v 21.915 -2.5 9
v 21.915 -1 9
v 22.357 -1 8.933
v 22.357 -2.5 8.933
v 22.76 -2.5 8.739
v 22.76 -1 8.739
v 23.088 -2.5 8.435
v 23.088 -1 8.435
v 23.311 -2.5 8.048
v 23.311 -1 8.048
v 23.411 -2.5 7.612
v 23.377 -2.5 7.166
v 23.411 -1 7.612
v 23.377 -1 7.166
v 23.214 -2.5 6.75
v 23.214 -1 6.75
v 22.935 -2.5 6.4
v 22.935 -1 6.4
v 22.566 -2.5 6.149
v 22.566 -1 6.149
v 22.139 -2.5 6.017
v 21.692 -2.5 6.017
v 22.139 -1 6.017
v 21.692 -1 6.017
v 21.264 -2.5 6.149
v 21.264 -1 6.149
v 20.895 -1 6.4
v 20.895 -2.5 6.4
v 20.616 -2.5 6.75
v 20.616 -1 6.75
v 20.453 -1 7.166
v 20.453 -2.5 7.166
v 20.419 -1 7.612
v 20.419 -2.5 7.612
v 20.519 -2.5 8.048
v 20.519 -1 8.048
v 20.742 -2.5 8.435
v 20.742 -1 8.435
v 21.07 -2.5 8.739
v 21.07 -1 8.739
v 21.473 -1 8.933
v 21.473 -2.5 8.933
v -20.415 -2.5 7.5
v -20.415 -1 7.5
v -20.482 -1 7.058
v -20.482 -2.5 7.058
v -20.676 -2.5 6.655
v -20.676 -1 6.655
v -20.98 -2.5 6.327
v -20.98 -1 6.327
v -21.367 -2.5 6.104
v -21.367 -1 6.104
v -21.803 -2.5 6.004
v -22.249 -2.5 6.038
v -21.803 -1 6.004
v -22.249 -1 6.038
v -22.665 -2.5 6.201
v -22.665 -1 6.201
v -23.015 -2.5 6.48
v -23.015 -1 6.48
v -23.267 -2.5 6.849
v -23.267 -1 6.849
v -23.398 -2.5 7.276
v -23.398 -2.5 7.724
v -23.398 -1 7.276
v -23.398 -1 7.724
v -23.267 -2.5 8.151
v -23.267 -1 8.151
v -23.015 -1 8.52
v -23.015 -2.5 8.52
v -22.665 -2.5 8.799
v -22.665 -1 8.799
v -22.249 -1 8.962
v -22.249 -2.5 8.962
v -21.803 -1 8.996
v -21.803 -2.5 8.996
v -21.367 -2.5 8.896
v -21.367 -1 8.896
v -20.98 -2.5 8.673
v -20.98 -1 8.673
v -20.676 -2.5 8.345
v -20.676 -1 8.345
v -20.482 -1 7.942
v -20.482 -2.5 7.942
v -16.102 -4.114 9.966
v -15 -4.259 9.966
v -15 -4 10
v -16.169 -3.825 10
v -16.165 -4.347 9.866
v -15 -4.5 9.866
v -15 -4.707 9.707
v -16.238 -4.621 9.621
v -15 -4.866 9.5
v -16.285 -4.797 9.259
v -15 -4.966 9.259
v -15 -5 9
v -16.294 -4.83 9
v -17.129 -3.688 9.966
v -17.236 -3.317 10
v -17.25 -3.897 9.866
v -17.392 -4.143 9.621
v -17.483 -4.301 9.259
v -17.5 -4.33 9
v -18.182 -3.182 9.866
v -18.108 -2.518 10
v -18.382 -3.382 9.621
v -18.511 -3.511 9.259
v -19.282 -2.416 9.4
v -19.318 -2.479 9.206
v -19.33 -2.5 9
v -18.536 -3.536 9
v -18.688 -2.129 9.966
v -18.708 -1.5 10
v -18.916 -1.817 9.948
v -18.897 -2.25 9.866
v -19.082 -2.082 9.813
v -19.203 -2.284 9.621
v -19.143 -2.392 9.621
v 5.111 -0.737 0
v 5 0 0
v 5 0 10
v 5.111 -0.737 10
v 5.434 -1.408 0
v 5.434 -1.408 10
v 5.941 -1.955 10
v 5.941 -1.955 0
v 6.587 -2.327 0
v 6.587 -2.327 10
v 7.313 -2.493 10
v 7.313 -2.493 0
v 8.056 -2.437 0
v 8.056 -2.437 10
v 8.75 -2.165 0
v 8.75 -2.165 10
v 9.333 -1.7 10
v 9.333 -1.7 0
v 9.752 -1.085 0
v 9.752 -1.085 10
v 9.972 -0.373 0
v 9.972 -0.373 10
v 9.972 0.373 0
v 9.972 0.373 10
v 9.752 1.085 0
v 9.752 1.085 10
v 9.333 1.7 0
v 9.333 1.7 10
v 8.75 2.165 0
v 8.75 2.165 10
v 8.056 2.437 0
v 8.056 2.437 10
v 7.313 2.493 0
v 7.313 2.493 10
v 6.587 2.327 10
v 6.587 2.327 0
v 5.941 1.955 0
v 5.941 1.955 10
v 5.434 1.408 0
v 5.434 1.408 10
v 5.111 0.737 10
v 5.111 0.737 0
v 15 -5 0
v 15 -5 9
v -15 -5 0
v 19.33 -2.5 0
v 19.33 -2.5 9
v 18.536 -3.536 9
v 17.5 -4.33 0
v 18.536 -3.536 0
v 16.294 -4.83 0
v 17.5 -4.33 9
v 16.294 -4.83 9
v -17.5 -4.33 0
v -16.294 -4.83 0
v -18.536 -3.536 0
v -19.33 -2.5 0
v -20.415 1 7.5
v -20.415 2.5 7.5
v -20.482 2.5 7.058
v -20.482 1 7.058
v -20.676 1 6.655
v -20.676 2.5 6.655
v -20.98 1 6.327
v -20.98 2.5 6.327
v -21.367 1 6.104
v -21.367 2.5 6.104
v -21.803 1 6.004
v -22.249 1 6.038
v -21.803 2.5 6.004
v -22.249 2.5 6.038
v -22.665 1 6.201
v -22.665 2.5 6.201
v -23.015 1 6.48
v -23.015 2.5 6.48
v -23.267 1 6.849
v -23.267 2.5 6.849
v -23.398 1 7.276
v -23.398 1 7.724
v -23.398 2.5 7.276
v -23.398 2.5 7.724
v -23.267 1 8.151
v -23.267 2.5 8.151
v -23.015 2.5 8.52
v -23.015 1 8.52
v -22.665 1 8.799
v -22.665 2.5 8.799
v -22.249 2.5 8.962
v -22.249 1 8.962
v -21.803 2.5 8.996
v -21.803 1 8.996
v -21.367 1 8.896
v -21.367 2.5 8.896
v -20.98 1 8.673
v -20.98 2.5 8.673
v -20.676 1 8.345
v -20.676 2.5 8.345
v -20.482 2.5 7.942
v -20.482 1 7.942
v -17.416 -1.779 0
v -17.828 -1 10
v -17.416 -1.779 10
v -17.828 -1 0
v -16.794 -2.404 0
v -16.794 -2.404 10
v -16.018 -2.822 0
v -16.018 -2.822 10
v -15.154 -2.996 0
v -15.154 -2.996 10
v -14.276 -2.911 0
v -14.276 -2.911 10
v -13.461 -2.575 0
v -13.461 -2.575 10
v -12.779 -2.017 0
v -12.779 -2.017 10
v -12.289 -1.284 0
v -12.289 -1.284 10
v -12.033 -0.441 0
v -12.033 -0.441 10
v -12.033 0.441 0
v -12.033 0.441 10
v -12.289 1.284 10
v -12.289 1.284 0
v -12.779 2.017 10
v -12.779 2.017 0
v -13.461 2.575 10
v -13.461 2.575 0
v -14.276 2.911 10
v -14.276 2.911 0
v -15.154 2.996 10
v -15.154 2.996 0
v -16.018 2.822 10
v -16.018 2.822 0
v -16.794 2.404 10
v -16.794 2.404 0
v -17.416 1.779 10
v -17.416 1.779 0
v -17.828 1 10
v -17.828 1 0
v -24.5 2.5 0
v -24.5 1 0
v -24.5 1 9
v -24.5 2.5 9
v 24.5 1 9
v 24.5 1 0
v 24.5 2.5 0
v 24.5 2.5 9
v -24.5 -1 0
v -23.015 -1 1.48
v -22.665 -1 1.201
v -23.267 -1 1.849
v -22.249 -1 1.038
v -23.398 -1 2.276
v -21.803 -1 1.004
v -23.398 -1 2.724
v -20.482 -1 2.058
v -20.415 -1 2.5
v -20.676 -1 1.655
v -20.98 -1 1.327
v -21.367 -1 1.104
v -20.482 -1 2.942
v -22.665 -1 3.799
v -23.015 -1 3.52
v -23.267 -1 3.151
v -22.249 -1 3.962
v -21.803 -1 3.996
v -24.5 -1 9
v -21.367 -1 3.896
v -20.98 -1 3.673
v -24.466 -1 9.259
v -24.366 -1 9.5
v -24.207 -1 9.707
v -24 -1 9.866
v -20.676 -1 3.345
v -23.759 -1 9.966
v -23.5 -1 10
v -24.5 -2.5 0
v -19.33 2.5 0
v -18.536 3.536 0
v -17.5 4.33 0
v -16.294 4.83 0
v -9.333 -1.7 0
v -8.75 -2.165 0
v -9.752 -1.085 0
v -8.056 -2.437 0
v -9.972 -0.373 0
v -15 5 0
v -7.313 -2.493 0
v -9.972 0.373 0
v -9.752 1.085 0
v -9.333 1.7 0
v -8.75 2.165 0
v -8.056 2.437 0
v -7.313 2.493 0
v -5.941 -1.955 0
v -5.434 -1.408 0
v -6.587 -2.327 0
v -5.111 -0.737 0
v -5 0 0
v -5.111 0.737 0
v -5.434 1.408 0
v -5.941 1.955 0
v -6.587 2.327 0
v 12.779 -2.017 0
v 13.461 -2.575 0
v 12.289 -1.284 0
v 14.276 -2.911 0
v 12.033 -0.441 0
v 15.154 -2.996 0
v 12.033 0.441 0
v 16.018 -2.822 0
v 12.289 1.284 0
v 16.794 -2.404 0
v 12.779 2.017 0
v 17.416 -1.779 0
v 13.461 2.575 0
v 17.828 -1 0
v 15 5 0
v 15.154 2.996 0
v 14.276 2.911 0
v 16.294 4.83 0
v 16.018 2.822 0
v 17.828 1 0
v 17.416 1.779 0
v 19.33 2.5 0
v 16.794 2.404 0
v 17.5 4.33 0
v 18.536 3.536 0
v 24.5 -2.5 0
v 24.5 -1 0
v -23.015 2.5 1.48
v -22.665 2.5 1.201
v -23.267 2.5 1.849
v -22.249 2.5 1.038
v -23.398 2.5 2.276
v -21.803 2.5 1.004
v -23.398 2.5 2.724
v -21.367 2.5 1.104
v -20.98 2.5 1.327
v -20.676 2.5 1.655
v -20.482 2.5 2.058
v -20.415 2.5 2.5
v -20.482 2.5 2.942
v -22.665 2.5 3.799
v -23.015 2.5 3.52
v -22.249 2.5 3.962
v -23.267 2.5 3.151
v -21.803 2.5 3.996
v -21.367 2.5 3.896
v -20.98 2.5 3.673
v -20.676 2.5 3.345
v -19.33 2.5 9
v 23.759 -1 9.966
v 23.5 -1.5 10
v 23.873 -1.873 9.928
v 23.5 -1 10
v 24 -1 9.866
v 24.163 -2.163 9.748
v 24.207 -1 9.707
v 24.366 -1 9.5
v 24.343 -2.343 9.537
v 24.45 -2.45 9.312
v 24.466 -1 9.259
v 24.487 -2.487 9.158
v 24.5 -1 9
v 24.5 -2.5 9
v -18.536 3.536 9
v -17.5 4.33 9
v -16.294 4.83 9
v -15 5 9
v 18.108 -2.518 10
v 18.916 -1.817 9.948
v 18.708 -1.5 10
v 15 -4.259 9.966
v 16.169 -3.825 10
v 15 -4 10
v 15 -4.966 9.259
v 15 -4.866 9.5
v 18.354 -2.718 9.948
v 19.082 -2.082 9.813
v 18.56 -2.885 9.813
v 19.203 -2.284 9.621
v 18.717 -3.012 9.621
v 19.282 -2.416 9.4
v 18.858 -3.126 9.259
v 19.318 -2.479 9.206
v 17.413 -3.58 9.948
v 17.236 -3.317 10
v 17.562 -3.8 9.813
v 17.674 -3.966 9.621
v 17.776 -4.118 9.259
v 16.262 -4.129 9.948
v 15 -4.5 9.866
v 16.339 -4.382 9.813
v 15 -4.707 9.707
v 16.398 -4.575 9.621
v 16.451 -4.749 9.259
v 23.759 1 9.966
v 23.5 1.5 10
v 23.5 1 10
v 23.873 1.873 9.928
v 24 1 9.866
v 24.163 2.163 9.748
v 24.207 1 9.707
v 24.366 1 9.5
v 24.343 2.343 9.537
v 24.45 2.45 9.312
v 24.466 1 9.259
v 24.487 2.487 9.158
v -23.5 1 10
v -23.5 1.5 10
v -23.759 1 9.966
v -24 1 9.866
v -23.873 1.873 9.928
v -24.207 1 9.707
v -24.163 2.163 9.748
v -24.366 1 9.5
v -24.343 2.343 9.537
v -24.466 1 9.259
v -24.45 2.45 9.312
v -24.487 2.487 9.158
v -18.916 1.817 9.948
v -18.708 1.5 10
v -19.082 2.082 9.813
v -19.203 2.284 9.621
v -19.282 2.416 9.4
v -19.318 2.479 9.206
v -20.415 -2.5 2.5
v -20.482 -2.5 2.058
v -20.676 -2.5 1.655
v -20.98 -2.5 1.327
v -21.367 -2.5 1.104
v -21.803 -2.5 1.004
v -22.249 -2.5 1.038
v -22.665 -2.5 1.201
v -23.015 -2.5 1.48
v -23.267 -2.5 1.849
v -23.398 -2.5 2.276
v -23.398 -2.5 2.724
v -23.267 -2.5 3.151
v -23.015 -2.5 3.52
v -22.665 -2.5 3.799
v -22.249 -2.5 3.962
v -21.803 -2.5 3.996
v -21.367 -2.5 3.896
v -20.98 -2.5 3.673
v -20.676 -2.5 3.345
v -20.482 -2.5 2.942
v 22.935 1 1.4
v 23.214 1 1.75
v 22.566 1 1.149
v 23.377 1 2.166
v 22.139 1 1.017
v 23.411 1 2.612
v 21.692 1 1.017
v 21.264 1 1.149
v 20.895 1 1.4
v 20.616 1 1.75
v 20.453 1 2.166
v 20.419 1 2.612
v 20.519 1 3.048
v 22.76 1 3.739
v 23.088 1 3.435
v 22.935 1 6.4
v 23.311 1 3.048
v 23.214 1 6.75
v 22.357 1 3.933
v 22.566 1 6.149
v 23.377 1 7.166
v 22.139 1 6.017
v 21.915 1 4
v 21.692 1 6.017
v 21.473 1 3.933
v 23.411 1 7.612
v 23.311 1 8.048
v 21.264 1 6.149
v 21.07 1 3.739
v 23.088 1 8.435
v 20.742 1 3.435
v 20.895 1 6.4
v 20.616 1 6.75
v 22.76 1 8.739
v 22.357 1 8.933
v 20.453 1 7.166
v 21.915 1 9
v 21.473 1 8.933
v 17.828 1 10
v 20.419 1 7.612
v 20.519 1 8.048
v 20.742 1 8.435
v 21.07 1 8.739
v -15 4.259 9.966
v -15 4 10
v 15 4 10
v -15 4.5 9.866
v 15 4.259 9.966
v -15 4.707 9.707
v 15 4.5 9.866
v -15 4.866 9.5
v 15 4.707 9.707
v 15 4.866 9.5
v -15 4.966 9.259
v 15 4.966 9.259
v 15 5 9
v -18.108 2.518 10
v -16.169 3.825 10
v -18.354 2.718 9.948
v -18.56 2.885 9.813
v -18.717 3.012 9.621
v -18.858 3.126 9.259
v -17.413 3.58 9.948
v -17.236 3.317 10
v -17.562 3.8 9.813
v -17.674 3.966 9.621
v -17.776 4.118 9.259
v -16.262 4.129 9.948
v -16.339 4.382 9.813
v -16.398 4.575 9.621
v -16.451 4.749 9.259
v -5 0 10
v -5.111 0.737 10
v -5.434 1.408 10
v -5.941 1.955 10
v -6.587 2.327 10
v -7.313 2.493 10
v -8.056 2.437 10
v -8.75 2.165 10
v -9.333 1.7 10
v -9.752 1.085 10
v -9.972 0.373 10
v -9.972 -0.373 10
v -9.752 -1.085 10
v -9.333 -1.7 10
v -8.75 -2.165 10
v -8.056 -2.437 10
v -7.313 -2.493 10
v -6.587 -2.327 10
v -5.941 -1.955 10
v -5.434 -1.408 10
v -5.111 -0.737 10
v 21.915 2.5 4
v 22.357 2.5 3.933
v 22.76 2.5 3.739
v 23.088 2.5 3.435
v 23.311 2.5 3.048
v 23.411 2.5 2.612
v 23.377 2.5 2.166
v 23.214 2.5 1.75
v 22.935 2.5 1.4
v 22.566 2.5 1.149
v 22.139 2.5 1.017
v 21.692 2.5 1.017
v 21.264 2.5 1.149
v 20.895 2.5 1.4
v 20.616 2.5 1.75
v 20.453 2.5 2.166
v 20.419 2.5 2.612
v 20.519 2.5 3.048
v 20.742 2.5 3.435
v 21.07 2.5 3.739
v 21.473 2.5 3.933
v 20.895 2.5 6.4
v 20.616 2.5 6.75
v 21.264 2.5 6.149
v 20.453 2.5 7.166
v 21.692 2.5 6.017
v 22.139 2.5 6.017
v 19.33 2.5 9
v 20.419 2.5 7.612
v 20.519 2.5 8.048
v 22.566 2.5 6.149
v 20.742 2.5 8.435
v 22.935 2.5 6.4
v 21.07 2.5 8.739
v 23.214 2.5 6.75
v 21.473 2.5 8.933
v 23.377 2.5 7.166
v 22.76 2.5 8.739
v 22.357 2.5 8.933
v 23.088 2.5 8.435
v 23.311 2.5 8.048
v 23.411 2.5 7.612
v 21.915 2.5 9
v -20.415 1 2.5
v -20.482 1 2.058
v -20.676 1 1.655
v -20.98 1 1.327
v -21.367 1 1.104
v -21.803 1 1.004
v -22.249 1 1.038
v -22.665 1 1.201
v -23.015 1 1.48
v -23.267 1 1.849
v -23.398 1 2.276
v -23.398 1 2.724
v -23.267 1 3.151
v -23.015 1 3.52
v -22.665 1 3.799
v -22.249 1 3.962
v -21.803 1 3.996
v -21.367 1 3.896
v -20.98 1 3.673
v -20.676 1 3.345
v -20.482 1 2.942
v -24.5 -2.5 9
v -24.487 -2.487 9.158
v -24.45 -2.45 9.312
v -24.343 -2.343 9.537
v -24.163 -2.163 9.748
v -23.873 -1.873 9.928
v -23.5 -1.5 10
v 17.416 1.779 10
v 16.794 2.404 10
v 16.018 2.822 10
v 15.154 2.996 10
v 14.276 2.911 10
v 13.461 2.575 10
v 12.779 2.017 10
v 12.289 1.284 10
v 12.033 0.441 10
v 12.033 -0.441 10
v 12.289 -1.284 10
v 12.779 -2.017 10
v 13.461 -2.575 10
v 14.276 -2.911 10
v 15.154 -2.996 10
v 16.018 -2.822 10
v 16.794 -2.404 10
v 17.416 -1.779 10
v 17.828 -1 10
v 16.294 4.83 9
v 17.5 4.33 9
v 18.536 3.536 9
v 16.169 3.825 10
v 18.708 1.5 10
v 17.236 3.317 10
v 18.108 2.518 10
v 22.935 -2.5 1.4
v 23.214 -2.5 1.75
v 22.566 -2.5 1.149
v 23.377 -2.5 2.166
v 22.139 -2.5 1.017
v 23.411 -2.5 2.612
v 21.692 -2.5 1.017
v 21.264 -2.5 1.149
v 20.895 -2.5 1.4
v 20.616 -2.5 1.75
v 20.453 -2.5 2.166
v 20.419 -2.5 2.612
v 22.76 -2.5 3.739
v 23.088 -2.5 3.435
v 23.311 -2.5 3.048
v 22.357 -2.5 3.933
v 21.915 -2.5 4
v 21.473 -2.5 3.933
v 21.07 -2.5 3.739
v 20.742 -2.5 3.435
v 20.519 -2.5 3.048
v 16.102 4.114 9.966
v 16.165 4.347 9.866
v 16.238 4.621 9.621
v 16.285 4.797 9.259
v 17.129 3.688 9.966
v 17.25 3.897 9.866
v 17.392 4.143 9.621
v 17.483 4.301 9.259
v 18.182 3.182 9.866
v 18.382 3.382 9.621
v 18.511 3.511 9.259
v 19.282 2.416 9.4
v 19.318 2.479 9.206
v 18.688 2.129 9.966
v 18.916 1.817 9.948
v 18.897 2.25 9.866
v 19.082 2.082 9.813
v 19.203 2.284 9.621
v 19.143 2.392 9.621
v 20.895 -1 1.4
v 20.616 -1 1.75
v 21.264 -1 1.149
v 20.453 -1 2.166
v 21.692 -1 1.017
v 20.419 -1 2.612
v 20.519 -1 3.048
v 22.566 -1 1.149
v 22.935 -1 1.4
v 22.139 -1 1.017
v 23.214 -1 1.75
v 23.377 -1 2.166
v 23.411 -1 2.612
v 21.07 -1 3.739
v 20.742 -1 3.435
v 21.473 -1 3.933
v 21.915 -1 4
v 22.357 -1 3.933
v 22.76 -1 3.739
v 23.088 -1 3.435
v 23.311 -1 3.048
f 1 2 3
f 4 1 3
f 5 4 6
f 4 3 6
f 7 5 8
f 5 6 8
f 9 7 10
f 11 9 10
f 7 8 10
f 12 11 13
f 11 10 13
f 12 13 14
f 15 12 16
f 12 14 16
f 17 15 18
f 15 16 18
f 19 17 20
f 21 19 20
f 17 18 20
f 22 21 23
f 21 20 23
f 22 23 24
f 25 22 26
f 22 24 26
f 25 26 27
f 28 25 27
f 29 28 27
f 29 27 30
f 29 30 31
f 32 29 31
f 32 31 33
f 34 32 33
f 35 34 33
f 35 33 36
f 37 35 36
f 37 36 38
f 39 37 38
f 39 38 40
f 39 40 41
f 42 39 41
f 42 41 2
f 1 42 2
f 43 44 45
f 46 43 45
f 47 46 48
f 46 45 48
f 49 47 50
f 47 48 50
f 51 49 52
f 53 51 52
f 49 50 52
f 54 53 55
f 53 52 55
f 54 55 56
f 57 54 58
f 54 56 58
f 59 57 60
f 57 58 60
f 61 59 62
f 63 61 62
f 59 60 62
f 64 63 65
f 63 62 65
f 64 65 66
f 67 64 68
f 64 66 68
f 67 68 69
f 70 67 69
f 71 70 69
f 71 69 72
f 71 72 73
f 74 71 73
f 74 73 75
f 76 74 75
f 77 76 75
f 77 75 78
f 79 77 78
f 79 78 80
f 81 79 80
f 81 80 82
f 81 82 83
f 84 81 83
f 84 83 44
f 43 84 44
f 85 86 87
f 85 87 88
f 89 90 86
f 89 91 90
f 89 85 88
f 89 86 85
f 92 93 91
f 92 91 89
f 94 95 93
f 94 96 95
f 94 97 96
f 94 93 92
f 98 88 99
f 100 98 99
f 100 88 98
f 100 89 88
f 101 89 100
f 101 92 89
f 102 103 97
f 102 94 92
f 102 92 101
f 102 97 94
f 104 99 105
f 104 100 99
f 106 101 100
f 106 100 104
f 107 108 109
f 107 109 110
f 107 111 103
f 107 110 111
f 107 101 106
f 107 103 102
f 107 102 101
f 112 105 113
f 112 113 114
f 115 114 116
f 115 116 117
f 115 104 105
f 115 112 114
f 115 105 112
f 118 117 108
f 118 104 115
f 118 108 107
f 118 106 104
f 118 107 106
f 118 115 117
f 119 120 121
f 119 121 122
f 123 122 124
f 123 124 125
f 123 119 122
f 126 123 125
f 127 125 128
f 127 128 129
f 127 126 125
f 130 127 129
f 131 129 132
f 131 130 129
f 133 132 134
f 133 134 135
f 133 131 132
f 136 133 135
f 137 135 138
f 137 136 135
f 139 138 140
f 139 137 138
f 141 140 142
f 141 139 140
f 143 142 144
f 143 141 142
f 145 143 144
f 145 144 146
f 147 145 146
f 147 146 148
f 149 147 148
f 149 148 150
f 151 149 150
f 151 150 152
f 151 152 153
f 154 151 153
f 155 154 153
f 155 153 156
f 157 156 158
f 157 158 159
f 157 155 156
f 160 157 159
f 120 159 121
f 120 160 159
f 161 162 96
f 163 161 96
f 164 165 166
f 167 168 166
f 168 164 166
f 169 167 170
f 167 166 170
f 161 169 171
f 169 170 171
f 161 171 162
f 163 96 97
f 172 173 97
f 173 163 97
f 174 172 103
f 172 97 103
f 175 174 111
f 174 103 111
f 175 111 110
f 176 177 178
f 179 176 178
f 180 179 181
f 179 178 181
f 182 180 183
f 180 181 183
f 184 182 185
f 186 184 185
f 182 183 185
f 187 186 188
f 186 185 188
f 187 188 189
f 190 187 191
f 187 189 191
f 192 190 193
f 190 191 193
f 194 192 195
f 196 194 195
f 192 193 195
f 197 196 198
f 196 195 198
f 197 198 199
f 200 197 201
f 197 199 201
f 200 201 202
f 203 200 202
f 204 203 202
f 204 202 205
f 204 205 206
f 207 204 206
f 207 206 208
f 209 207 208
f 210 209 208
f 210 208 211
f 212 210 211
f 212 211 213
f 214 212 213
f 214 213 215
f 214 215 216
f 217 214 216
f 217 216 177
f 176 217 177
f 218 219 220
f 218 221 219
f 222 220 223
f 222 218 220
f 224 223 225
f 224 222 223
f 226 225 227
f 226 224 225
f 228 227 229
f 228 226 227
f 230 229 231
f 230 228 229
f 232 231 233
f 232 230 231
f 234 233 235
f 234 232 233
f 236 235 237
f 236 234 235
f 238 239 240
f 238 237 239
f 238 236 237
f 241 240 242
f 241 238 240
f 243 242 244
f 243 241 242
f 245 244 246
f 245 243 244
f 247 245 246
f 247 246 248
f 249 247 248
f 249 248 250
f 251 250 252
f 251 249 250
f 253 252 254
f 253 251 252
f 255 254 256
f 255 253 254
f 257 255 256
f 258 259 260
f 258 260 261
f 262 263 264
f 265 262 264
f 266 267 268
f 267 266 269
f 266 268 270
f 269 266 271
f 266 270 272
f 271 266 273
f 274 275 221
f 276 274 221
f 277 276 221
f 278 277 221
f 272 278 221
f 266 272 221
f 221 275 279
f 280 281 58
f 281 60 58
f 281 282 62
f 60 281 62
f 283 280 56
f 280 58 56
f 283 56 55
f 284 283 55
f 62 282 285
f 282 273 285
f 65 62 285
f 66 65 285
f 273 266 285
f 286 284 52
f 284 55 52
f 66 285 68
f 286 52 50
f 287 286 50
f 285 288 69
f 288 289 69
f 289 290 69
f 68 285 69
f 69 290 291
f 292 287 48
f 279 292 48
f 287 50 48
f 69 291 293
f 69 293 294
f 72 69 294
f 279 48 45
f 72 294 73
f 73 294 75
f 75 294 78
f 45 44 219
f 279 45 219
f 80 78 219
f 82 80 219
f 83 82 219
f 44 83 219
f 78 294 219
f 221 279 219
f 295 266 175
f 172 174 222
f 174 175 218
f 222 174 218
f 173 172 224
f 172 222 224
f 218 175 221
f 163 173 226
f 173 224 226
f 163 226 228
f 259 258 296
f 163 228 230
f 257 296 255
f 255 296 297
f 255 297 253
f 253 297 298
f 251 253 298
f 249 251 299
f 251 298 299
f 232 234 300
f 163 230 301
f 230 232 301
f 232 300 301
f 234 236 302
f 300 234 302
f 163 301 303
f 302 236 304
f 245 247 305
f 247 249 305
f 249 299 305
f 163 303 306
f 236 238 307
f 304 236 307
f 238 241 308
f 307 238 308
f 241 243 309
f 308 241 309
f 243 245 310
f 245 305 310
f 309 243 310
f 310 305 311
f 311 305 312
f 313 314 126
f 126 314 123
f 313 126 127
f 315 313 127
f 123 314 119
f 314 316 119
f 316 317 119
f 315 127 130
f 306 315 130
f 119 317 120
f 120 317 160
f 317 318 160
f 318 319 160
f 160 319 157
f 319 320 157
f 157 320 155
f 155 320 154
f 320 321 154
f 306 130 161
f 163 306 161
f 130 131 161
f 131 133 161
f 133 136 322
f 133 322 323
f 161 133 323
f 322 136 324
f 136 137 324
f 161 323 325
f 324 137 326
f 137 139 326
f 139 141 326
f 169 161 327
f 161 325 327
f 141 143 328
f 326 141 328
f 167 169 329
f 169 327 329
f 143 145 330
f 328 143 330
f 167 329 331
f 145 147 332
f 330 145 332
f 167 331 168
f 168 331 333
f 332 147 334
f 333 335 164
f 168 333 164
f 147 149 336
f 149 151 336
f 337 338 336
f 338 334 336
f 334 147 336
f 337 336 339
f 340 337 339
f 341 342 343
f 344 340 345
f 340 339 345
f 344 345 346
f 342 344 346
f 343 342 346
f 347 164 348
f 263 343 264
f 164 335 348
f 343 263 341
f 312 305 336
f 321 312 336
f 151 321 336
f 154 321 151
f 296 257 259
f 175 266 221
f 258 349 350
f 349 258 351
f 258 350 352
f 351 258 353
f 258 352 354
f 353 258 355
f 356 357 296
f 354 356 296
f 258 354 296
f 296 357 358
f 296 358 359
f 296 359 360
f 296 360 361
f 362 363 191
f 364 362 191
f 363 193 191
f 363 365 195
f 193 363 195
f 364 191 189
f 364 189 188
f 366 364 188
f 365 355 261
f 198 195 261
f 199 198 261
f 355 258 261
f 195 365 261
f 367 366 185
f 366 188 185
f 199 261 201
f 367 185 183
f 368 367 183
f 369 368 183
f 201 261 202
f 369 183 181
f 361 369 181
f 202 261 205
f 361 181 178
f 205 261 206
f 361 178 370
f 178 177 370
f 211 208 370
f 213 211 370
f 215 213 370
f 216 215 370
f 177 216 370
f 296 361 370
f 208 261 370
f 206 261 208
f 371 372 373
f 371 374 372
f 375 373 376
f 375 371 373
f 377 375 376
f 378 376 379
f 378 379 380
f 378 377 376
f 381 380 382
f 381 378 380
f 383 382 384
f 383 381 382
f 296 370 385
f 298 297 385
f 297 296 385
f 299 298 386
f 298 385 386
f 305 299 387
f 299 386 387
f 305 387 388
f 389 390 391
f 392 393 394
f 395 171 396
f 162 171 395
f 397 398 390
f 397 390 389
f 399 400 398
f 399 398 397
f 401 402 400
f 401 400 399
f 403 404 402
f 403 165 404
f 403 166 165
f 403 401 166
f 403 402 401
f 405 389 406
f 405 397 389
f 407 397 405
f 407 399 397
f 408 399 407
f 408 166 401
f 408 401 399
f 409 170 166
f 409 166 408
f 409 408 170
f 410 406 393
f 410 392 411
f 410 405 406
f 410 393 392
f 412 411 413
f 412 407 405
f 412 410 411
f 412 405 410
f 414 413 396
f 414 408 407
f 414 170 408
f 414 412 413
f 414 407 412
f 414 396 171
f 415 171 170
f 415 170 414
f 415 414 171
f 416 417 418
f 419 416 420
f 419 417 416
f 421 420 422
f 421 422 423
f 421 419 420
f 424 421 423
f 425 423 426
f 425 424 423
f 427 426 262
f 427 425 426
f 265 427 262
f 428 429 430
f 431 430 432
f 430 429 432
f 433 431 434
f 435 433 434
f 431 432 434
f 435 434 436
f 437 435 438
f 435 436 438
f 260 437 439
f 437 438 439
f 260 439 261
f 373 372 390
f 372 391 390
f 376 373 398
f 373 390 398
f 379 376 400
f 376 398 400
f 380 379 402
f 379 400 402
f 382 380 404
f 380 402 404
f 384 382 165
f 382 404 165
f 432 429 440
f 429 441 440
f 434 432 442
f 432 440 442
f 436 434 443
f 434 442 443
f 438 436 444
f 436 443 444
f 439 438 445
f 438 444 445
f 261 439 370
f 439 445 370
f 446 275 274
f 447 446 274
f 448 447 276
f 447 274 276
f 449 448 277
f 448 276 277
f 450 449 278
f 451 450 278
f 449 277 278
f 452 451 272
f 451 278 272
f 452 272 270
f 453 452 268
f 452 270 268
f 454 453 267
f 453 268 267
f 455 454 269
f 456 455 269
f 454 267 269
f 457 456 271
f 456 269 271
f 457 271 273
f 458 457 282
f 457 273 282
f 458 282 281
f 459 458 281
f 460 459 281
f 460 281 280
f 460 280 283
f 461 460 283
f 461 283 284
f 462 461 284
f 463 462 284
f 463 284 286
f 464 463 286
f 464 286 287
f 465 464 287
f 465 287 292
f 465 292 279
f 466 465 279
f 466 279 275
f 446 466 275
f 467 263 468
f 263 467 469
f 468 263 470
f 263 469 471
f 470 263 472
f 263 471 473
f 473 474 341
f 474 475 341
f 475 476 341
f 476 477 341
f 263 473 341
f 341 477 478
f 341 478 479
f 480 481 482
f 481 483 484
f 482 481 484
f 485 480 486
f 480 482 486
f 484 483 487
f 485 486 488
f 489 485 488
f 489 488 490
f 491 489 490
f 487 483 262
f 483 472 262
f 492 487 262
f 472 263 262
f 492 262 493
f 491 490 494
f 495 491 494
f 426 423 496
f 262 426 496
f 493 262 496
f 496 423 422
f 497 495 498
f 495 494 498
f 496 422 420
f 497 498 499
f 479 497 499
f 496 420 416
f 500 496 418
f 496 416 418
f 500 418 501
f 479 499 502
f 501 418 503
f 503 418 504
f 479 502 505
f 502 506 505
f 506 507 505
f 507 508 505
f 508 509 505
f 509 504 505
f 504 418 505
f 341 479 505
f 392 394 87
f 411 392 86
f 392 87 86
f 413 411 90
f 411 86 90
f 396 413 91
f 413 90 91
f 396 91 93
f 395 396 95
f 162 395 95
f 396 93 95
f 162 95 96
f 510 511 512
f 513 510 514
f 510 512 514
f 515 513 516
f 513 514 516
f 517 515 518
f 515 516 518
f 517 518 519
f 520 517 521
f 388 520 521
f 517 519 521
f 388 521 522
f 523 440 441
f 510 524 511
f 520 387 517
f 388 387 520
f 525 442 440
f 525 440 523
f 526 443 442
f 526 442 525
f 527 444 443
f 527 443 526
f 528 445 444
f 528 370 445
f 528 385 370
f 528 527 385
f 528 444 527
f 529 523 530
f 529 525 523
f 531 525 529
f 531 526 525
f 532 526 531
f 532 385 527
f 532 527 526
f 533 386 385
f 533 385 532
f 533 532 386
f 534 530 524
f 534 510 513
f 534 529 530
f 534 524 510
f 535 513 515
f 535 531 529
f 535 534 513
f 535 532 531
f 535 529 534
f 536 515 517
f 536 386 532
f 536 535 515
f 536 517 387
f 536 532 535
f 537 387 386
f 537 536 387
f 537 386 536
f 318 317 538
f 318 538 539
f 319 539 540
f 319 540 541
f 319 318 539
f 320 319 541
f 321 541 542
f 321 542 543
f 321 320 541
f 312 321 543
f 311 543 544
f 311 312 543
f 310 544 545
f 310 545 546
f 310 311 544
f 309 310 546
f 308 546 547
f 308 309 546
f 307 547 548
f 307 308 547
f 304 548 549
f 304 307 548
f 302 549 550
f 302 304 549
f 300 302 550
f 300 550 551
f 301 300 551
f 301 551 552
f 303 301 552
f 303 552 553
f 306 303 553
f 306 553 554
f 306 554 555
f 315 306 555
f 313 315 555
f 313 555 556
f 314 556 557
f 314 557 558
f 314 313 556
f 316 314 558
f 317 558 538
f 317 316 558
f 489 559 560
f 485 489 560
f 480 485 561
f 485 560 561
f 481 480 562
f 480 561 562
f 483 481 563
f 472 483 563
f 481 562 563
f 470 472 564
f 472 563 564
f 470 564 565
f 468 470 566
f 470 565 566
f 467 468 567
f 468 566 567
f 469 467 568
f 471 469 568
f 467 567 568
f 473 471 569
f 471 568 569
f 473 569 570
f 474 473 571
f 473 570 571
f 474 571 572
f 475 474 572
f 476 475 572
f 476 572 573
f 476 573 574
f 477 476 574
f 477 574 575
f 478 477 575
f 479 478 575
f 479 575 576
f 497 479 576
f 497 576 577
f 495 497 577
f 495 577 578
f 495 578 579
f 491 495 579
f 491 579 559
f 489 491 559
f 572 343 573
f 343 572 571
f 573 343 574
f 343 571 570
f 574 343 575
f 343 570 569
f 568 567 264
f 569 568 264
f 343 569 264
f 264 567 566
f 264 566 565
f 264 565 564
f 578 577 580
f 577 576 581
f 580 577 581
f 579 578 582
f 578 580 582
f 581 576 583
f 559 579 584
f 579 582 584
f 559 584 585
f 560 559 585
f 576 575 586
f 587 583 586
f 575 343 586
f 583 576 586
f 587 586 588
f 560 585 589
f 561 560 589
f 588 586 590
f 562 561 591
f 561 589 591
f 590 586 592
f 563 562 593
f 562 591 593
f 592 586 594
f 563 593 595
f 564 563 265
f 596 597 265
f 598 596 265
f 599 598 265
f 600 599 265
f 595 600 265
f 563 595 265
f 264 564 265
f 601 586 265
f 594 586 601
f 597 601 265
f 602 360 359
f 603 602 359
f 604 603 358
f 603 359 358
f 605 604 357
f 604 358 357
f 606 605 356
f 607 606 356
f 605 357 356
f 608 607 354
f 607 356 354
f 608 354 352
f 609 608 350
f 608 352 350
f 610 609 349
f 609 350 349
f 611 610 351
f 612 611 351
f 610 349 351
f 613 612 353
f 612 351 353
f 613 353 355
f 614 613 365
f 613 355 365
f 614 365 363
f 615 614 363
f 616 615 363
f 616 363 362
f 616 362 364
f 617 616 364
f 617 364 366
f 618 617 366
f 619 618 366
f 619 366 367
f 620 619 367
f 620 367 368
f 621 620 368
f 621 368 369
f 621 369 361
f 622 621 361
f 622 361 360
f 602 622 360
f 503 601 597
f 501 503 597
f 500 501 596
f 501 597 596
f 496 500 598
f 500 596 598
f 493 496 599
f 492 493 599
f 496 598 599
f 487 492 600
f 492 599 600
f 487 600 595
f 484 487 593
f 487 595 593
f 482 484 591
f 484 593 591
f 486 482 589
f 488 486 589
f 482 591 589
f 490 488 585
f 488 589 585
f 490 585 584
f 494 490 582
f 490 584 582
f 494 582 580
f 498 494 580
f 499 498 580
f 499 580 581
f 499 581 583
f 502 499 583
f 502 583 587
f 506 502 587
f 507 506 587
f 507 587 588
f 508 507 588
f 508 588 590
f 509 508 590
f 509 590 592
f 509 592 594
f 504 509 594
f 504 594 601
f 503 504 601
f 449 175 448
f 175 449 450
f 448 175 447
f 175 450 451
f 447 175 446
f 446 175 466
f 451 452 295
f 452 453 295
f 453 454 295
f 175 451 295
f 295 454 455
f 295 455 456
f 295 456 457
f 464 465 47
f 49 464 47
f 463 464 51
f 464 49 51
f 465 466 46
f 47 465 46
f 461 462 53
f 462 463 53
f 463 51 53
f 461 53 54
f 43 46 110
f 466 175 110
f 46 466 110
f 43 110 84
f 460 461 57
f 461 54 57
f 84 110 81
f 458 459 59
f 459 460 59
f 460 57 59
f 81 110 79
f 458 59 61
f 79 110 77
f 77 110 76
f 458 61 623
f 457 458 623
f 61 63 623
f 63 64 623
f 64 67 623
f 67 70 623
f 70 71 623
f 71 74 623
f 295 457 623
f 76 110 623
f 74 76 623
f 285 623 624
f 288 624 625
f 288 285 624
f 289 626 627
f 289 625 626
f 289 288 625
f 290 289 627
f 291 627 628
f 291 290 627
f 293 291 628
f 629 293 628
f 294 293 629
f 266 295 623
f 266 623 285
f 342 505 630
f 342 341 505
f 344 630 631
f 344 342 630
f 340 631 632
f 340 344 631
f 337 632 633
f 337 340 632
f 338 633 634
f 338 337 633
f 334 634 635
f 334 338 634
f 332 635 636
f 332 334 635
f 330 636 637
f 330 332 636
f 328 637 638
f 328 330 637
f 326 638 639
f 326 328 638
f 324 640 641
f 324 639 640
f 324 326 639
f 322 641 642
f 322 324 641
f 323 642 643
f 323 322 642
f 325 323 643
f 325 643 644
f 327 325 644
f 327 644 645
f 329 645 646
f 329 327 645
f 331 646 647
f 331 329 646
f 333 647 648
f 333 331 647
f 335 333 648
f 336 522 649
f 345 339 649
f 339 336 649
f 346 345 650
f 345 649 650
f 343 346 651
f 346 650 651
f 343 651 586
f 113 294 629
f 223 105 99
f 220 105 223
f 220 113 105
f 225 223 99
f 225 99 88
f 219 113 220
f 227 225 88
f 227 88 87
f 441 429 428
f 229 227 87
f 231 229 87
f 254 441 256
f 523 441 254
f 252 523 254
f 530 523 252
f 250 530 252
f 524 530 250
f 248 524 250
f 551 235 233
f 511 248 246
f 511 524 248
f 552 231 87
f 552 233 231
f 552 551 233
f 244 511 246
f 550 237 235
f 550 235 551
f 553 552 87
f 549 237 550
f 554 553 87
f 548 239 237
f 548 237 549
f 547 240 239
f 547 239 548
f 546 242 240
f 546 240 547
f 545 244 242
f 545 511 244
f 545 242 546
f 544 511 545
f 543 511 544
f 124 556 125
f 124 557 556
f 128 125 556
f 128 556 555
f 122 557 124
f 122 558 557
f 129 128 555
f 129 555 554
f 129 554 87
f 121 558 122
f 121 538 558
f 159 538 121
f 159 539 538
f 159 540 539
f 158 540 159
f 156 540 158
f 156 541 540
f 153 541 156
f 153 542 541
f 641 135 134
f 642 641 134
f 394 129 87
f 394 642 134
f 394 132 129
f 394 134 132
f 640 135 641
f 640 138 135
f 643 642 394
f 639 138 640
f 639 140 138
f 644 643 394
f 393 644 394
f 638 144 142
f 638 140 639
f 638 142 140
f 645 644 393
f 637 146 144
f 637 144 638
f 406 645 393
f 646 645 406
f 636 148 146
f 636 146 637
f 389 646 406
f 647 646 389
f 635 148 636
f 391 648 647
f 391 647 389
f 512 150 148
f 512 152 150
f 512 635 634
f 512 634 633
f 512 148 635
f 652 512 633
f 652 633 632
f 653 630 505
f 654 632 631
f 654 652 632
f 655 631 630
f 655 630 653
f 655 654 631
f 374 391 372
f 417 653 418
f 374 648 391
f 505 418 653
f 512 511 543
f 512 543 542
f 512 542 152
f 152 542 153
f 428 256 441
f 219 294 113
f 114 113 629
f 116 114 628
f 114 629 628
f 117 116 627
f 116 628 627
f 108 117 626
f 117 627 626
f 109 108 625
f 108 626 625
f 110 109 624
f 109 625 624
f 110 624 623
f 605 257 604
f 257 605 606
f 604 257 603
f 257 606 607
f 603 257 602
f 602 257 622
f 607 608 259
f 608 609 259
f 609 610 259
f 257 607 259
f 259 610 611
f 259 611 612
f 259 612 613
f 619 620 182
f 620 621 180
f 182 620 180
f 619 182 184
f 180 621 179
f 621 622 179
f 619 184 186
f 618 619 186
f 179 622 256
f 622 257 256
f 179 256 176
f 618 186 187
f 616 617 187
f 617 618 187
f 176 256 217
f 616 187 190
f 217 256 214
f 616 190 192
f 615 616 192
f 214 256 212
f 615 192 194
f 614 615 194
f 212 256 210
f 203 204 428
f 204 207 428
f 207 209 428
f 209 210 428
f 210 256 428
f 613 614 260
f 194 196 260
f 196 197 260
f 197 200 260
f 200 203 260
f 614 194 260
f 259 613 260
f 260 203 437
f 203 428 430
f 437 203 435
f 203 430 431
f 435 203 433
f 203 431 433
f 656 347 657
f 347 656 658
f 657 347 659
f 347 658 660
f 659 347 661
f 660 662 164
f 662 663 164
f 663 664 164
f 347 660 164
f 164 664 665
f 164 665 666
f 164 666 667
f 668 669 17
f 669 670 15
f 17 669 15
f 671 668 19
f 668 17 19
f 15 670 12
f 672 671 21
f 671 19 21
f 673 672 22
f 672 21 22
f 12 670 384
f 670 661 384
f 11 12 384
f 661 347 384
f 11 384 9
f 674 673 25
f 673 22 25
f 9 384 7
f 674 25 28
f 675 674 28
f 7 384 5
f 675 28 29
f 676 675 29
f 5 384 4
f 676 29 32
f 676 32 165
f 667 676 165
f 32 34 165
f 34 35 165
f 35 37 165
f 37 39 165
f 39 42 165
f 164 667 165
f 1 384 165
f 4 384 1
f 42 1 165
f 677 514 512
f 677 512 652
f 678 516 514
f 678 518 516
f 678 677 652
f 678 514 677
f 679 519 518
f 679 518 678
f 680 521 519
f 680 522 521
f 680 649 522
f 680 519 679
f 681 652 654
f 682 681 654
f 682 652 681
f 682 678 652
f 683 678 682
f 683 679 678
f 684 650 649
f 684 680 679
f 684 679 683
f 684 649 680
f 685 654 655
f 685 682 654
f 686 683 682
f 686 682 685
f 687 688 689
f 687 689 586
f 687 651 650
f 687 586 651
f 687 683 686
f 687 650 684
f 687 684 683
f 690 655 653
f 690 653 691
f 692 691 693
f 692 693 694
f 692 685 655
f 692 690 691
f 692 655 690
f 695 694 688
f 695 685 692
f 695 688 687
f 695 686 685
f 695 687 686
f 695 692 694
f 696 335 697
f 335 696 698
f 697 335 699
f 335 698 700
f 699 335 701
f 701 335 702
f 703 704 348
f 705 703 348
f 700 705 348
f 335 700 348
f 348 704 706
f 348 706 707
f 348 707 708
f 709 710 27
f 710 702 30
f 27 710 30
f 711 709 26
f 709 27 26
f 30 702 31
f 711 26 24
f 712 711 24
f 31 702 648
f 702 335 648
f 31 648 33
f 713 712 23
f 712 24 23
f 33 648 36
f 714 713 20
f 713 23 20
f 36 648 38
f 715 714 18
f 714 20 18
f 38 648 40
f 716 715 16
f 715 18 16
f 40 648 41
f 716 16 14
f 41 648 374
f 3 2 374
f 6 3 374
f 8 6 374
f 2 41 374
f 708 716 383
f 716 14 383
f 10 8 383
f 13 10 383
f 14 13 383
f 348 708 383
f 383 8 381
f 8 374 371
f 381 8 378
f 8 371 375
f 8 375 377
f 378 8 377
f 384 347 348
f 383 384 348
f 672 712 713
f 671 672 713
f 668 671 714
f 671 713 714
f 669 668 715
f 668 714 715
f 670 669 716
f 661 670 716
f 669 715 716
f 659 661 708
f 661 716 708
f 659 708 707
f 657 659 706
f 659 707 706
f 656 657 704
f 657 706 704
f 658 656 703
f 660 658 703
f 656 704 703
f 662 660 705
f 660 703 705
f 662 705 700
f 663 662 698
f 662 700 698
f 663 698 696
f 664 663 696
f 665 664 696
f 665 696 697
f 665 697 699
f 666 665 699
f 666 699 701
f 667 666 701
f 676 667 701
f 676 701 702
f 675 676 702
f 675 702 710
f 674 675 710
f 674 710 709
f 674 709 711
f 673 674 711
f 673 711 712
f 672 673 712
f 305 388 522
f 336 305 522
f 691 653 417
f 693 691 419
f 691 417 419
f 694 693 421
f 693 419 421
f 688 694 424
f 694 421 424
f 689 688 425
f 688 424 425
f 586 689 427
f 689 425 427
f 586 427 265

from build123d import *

# Parameters (mm, degrees)
SKETCH_1_W          = 49
SKETCH_1_H          = 12
SKETCH_1_R          = 3
SKETCH_1_R_2        = 2.5
EXTRUDE_1_DEPTH     = 10
CUT_EXTRUDE_1_DEPTH = 28.133927102
SKETCH_3_R          = 1.5
CUT_EXTRUDE_2_DEPTH = 29.28869032
FILLET_1_R          = 1


with BuildPart() as part:
    # 스케치1 → 보스-돌출1 (new body)
    with BuildSketch(Plane.XY):
        Rectangle(SKETCH_1_W, SKETCH_1_H)
        with Locations((-15, 0)):
            Circle(SKETCH_1_R, mode=Mode.SUBTRACT)
        with Locations(Location((15, 0, 0), (0, 0, 180))):
            Circle(SKETCH_1_R, mode=Mode.SUBTRACT)
        with Locations((-7.5, 0)):
            Circle(SKETCH_1_R_2, mode=Mode.SUBTRACT)
        with Locations(Location((7.5, 0, 0), (0, 0, 180))):
            Circle(SKETCH_1_R_2, mode=Mode.SUBTRACT)
    extrude(amount=EXTRUDE_1_DEPTH)

    # 스케치2 → 컷-돌출1 (cut, through all)
    with BuildSketch(Plane.XY.offset(10)):
        with BuildLine():
            ThreePointArc((-19.330127019, 2.5), (-17.5, 4.330127019), (-15, 5))
            Line((-15, 5), (15, 5))
            ThreePointArc((15, 5), (17.5, 4.330127019), (19.330127019, 2.5))
            Line((19.330127019, 2.5), (24.5, 2.5))
            Line((24.5, 2.5), (24.5, 6))
            Line((24.5, 6), (-24.5, 6))
            Line((-24.5, 6), (-24.5, 2.5))
            Line((-24.5, 2.5), (-19.330127019, 2.5))
        make_face()
        with BuildLine():
            ThreePointArc((-15, -5), (-17.5, -4.330127019), (-19.330127019, -2.5))
            Line((-19.330127019, -2.5), (-24.5, -2.5))
            Line((-24.5, -2.5), (-24.5, -6))
            Line((-24.5, -6), (24.5, -6))
            Line((24.5, -6), (24.5, -2.5))
            Line((24.5, -2.5), (19.330127019, -2.5))
            ThreePointArc((19.330127019, -2.5), (17.5, -4.330127019), (15, -5))
            Line((15, -5), (-15, -5))
        make_face()
        with BuildLine():
            ThreePointArc((-19.898979486, -1), (-20, 0), (-19.898979486, 1))
            Line((-19.898979486, 1), (-24.5, 1))
            Line((-24.5, 1), (-24.5, -1))
            Line((-24.5, -1), (-19.898979486, -1))
        make_face()
        with BuildLine():
            Line((24.5, 1), (19.898979486, 1))
            ThreePointArc((19.898979486, 1), (20, 0), (19.898979486, -1))
            Line((19.898979486, -1), (24.5, -1))
            Line((24.5, -1), (24.5, 1))
        make_face()
        with BuildLine():
            Line((-17.828427125, 1), (-19.898979486, 1))
            ThreePointArc((-19.898979486, 1), (-20, 0), (-19.898979486, -1))
            Line((-19.898979486, -1), (-17.828427125, -1))
            ThreePointArc((-17.828427125, -1), (-18, 0), (-17.828427125, 1))
        make_face()
        with BuildLine():
            ThreePointArc((19.898979486, -1), (20, 0), (19.898979486, 1))
            Line((19.898979486, 1), (17.828427125, 1))
            ThreePointArc((17.828427125, 1), (17.956795679, 0.507305936), (18, 0))
            ThreePointArc((18, 0), (17.956795679, -0.507305936), (17.828427125, -1))
            Line((17.828427125, -1), (19.898979486, -1))
        make_face()
    extrude(amount=-CUT_EXTRUDE_1_DEPTH, mode=Mode.SUBTRACT)

    # 스케치3 → 컷-돌출2 (cut, through all)
    with BuildSketch(Plane(origin=(0, 5, 0), x_dir=(1, 0, 0), z_dir=(0, 1, 0))):
        with Locations((-21.915063509, -2.5)):
            Circle(SKETCH_3_R)
        with Locations((-21.915063509, -7.5)):
            Circle(SKETCH_3_R)
        with Locations(Location((21.915063509, -7.5, 0), (0, 0, 270))):
            Circle(SKETCH_3_R)
        with Locations(Location((21.915063509, -2.5, 0), (0, 0, 270))):
            Circle(SKETCH_3_R)
    extrude(amount=-CUT_EXTRUDE_2_DEPTH, mode=Mode.SUBTRACT)

    # 필렛1
    fillet_1_edges = [part.edges().sort_by_distance(p)[0] for p in [
        (-24.5, 1.75, 10),
        (17.5, 4.330127019, 10),
        (-17.5, 4.330127019, 10),
        (21.915063509, 2.5, 10),
        (-21.915063509, 2.5, 10),
        (0, 5, 10),
        (24.5, -1.75, 10),
        (17.5, -4.330127019, 10),
        (-21.915063509, -2.5, 10),
        (-17.5, -4.330127019, 10),
        (0, -5, 10),
        (21.915063509, -2.5, 10),
        (-24.5, -1.75, 10),
        (24.5, 1.75, 10),
    ]]
    fillet(fillet_1_edges, radius=FILLET_1_R - 0.0001)  # a hair under: the kernel refuses the full size


solid = part.part
